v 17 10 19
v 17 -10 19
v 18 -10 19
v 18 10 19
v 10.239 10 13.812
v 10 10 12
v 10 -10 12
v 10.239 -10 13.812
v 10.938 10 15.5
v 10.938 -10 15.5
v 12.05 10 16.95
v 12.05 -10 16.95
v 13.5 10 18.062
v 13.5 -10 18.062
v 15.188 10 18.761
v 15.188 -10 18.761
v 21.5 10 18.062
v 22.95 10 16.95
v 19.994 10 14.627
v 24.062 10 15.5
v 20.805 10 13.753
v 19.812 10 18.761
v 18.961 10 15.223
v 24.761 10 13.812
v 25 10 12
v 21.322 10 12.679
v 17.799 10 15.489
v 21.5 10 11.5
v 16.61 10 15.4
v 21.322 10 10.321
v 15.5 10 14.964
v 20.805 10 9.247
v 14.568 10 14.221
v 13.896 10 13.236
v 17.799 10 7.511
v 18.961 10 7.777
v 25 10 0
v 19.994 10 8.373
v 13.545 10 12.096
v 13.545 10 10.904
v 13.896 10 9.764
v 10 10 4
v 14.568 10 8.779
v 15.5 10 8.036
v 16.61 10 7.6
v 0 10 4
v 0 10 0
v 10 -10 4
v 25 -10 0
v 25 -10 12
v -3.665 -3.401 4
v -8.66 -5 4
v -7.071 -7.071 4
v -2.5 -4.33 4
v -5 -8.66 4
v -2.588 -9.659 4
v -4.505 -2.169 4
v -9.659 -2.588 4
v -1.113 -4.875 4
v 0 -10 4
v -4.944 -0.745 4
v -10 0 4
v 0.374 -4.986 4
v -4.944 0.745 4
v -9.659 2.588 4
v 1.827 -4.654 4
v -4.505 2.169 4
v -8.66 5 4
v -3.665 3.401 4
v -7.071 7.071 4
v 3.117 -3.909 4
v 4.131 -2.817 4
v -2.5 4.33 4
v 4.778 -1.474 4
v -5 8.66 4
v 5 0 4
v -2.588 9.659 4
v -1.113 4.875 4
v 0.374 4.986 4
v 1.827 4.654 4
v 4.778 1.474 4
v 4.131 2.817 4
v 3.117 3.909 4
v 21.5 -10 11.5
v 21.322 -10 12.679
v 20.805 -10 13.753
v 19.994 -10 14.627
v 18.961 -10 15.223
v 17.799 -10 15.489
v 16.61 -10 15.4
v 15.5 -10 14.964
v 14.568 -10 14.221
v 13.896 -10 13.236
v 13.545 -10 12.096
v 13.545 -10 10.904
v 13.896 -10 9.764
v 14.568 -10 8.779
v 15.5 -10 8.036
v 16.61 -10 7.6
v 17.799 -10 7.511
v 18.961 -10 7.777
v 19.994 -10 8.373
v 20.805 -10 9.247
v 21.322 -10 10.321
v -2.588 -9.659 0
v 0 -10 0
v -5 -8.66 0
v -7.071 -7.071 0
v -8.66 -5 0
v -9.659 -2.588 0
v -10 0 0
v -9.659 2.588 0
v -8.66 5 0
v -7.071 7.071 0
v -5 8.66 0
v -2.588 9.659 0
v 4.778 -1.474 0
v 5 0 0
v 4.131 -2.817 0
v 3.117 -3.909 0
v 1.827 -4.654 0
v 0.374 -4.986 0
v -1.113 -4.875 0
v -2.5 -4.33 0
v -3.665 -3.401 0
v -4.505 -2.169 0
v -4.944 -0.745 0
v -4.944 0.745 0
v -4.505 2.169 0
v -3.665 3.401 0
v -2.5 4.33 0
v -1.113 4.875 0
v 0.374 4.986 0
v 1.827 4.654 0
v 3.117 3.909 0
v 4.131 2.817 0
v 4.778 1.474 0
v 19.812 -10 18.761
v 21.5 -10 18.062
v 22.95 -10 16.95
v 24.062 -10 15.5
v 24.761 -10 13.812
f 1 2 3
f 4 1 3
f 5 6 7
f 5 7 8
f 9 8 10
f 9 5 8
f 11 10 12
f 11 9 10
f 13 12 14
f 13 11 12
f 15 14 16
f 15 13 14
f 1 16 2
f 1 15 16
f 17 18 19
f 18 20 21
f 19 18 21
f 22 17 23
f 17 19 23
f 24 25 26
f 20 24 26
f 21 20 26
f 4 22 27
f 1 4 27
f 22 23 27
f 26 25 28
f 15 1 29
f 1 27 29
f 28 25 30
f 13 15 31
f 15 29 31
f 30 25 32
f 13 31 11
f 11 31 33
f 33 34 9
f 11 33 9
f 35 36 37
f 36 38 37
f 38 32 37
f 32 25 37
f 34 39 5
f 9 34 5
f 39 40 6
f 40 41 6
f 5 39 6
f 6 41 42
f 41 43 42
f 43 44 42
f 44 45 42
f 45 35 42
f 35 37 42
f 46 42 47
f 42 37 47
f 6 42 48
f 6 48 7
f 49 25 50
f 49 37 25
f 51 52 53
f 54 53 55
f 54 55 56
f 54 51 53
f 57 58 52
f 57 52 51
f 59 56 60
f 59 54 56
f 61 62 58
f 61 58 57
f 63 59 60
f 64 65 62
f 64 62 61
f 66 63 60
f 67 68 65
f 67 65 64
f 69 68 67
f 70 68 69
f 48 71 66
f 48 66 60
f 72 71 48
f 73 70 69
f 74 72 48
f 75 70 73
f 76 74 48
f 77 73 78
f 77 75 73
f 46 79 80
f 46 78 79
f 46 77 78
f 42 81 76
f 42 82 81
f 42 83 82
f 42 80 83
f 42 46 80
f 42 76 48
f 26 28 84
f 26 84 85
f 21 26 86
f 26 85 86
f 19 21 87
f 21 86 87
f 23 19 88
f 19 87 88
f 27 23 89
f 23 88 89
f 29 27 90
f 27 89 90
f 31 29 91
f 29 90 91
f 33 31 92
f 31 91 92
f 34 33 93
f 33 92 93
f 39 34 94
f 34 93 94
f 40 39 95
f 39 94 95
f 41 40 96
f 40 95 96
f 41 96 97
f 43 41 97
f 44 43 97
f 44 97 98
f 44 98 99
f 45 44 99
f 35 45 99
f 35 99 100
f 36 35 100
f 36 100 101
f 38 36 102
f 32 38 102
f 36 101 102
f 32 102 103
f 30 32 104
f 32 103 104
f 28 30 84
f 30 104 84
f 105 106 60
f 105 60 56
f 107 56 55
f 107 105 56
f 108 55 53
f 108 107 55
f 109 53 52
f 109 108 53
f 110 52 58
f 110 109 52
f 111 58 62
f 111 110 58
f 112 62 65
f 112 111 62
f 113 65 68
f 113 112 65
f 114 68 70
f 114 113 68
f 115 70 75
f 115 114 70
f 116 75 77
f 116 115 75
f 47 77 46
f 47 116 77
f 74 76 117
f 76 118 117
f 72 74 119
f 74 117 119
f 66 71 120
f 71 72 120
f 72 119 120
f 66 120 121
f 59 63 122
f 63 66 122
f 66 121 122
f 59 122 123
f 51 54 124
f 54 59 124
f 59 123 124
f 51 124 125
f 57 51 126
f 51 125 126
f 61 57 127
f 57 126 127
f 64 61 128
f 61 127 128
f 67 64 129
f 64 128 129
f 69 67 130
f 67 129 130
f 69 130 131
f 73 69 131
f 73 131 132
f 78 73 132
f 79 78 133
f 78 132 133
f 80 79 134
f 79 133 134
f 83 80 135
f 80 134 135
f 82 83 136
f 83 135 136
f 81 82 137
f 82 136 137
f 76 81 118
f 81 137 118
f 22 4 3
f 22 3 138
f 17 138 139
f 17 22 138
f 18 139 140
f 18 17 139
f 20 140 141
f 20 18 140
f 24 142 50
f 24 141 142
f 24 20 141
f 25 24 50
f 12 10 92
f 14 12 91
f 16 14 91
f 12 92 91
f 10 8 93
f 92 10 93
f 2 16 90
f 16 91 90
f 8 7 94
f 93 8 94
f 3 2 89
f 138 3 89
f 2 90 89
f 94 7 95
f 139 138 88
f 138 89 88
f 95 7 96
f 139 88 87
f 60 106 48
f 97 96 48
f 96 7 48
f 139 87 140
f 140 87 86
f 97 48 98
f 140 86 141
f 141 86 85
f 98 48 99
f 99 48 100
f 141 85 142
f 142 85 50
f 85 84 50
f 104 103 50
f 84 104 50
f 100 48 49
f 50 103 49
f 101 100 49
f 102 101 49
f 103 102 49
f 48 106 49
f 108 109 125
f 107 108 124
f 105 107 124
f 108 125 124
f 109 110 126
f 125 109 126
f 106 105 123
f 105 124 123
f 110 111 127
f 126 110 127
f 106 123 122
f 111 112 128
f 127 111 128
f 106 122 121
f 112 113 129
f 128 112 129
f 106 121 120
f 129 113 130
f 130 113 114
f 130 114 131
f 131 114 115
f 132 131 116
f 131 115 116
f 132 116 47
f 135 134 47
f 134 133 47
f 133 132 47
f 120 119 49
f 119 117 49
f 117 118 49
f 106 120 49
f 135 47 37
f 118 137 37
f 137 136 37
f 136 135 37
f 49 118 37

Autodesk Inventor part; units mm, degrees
ref_plane "YZ Plane" through (0, 0, 0) normal (1, 0, 0) x (0, 1, 0)
ref_plane "XZ Plane" through (0, 0, 0) normal (0, 1, 0) x (-1, 0, 0)
ref_plane "XY Plane" through (0, 0, 0) normal (0, 0, 1) x (1, 0, 0)
sketch "Sketch1" plane through (0, 0, 0) normal (0, 0, 1) x (1, 0, 0)
  circle A0 centre (0, 0) radius 5
  line L0 (0, 0) -> (25, 0) construction
  line L1 (0, -10) -> (25, -10)
  line L2 (25, 10) -> (0, 10)
  arc A1 (0, 10) -> (0, -10) centre (0, 0) ccw
  arc A2 (25, -10) -> (25, 10) centre (25, 0) ccw construction
  line L3 (25, 10) -> (25, -10)
  point P0 (12.5, 0)
  dimension "d0" = 10
  dimension "d1" = 5
  dimension "d2" = 25
extrude "Extrusion1" add sketch "Sketch1" along normal blind 4
sketch "Sketch2" plane through (0, -10, 0) normal (0, -1, 0) x (1, 0, 0)
  line L0 (0, 4) -> (25, 4) projected
  line L1 (25, 4) -> (10, 4)
  line L2 (10, 4) -> (10, 19)
  line L3 (10, 19) -> (25, 19)
  line L4 (25, 19) -> (25, 4)
  line L5 (17.5, 19) -> (17.5, 4) construction
  circle A0 centre (17.5, 11.5) radius 4
  point P0 (0, 0)
  dimension "d5" = 8
  dimension "d6" = 15
  dimension "d7" = 15
extrude "Extrusion2" add sketch "Sketch2" against normal up to surface (20 mm away)
fillet "Fillet1" radius 7 2 edges at (25, 0, 19) (10, 0, 19)
properties part number "cylinder bracket"
